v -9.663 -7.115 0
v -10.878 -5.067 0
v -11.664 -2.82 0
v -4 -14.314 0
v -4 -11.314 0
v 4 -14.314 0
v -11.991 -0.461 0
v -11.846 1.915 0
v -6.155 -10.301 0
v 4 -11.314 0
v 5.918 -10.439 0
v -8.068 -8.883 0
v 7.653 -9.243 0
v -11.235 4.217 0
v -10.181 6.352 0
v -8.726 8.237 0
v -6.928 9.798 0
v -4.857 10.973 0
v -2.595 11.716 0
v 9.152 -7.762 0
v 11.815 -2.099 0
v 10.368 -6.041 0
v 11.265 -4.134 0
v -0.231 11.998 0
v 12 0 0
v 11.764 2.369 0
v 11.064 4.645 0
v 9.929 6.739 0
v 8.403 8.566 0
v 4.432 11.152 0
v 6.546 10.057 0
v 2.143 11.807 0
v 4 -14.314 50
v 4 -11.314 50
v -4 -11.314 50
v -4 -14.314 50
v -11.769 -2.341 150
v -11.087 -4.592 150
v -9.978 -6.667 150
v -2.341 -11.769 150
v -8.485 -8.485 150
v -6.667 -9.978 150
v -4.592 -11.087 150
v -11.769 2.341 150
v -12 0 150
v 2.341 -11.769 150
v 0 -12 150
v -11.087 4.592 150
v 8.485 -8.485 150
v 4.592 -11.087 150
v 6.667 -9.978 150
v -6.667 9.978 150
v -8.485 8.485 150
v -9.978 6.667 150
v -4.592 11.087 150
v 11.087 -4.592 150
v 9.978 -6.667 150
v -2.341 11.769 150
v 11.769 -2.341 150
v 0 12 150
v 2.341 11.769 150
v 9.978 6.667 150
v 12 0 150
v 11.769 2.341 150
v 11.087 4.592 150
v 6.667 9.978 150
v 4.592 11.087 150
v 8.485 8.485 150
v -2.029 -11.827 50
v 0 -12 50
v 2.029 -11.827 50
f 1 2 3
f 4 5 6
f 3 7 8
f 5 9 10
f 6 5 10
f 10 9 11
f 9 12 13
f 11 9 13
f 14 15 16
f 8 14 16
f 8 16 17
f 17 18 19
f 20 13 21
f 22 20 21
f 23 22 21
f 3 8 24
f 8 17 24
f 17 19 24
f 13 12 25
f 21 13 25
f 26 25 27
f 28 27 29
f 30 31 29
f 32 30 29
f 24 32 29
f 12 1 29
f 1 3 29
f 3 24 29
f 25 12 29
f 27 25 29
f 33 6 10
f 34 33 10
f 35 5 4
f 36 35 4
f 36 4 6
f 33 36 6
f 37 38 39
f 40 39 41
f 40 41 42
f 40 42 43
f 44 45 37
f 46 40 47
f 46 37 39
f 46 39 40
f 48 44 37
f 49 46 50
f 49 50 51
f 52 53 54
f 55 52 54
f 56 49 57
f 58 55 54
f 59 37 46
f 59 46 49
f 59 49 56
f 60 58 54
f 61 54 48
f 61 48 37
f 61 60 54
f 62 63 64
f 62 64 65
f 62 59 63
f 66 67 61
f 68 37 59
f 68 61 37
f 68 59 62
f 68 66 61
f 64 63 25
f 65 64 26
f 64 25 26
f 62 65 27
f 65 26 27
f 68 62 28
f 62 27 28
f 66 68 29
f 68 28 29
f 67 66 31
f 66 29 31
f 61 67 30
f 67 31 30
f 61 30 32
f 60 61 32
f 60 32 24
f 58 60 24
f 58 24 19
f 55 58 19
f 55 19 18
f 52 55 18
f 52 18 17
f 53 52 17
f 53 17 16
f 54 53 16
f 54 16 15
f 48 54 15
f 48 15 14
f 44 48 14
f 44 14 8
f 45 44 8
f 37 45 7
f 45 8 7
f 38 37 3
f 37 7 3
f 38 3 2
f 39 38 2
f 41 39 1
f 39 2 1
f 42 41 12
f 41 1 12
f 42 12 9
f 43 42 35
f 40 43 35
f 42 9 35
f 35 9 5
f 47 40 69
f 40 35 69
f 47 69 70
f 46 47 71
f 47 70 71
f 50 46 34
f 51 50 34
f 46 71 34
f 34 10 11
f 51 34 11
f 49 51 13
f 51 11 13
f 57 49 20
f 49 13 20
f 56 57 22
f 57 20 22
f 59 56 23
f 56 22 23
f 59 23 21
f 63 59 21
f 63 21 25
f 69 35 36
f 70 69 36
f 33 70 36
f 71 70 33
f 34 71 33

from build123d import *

# Parameters (mm, degrees)
RESSALTO_EXTRUS_O4_DEPTH = 50
RESSALTO_EXTRUS_O5_DEPTH = 150


with BuildPart() as part:
    # Esboço2 → Ressalto-extrusão4 (new body)
    with BuildSketch(Plane.XY):
        with BuildLine():
            Line((4, -14.313708499), (4, -11.313708499))
            ThreePointArc((4, -11.313708499), (0, -12), (-4, -11.313708499))
            Line((-4, -11.313708499), (-4, -14.313708499))
            Line((-4, -14.313708499), (4, -14.313708499))
        make_face()
    extrude(amount=RESSALTO_EXTRUS_O4_DEPTH)

    # Esboço2<3> → Ressalto-extrusão5 (add)
    with BuildSketch(Plane.XY):
        with BuildLine():
            ThreePointArc((-4, -11.313708499), (0, -12), (4, -11.313708499))
            ThreePointArc((4, -11.313708499), (9.797958971, -6.92820323), (12, 0))
            ThreePointArc((12, 0), (-6.92820323, 9.797958971), (-4, -11.313708499))
        make_face()
    extrude(amount=RESSALTO_EXTRUS_O5_DEPTH)


solid = part.part
